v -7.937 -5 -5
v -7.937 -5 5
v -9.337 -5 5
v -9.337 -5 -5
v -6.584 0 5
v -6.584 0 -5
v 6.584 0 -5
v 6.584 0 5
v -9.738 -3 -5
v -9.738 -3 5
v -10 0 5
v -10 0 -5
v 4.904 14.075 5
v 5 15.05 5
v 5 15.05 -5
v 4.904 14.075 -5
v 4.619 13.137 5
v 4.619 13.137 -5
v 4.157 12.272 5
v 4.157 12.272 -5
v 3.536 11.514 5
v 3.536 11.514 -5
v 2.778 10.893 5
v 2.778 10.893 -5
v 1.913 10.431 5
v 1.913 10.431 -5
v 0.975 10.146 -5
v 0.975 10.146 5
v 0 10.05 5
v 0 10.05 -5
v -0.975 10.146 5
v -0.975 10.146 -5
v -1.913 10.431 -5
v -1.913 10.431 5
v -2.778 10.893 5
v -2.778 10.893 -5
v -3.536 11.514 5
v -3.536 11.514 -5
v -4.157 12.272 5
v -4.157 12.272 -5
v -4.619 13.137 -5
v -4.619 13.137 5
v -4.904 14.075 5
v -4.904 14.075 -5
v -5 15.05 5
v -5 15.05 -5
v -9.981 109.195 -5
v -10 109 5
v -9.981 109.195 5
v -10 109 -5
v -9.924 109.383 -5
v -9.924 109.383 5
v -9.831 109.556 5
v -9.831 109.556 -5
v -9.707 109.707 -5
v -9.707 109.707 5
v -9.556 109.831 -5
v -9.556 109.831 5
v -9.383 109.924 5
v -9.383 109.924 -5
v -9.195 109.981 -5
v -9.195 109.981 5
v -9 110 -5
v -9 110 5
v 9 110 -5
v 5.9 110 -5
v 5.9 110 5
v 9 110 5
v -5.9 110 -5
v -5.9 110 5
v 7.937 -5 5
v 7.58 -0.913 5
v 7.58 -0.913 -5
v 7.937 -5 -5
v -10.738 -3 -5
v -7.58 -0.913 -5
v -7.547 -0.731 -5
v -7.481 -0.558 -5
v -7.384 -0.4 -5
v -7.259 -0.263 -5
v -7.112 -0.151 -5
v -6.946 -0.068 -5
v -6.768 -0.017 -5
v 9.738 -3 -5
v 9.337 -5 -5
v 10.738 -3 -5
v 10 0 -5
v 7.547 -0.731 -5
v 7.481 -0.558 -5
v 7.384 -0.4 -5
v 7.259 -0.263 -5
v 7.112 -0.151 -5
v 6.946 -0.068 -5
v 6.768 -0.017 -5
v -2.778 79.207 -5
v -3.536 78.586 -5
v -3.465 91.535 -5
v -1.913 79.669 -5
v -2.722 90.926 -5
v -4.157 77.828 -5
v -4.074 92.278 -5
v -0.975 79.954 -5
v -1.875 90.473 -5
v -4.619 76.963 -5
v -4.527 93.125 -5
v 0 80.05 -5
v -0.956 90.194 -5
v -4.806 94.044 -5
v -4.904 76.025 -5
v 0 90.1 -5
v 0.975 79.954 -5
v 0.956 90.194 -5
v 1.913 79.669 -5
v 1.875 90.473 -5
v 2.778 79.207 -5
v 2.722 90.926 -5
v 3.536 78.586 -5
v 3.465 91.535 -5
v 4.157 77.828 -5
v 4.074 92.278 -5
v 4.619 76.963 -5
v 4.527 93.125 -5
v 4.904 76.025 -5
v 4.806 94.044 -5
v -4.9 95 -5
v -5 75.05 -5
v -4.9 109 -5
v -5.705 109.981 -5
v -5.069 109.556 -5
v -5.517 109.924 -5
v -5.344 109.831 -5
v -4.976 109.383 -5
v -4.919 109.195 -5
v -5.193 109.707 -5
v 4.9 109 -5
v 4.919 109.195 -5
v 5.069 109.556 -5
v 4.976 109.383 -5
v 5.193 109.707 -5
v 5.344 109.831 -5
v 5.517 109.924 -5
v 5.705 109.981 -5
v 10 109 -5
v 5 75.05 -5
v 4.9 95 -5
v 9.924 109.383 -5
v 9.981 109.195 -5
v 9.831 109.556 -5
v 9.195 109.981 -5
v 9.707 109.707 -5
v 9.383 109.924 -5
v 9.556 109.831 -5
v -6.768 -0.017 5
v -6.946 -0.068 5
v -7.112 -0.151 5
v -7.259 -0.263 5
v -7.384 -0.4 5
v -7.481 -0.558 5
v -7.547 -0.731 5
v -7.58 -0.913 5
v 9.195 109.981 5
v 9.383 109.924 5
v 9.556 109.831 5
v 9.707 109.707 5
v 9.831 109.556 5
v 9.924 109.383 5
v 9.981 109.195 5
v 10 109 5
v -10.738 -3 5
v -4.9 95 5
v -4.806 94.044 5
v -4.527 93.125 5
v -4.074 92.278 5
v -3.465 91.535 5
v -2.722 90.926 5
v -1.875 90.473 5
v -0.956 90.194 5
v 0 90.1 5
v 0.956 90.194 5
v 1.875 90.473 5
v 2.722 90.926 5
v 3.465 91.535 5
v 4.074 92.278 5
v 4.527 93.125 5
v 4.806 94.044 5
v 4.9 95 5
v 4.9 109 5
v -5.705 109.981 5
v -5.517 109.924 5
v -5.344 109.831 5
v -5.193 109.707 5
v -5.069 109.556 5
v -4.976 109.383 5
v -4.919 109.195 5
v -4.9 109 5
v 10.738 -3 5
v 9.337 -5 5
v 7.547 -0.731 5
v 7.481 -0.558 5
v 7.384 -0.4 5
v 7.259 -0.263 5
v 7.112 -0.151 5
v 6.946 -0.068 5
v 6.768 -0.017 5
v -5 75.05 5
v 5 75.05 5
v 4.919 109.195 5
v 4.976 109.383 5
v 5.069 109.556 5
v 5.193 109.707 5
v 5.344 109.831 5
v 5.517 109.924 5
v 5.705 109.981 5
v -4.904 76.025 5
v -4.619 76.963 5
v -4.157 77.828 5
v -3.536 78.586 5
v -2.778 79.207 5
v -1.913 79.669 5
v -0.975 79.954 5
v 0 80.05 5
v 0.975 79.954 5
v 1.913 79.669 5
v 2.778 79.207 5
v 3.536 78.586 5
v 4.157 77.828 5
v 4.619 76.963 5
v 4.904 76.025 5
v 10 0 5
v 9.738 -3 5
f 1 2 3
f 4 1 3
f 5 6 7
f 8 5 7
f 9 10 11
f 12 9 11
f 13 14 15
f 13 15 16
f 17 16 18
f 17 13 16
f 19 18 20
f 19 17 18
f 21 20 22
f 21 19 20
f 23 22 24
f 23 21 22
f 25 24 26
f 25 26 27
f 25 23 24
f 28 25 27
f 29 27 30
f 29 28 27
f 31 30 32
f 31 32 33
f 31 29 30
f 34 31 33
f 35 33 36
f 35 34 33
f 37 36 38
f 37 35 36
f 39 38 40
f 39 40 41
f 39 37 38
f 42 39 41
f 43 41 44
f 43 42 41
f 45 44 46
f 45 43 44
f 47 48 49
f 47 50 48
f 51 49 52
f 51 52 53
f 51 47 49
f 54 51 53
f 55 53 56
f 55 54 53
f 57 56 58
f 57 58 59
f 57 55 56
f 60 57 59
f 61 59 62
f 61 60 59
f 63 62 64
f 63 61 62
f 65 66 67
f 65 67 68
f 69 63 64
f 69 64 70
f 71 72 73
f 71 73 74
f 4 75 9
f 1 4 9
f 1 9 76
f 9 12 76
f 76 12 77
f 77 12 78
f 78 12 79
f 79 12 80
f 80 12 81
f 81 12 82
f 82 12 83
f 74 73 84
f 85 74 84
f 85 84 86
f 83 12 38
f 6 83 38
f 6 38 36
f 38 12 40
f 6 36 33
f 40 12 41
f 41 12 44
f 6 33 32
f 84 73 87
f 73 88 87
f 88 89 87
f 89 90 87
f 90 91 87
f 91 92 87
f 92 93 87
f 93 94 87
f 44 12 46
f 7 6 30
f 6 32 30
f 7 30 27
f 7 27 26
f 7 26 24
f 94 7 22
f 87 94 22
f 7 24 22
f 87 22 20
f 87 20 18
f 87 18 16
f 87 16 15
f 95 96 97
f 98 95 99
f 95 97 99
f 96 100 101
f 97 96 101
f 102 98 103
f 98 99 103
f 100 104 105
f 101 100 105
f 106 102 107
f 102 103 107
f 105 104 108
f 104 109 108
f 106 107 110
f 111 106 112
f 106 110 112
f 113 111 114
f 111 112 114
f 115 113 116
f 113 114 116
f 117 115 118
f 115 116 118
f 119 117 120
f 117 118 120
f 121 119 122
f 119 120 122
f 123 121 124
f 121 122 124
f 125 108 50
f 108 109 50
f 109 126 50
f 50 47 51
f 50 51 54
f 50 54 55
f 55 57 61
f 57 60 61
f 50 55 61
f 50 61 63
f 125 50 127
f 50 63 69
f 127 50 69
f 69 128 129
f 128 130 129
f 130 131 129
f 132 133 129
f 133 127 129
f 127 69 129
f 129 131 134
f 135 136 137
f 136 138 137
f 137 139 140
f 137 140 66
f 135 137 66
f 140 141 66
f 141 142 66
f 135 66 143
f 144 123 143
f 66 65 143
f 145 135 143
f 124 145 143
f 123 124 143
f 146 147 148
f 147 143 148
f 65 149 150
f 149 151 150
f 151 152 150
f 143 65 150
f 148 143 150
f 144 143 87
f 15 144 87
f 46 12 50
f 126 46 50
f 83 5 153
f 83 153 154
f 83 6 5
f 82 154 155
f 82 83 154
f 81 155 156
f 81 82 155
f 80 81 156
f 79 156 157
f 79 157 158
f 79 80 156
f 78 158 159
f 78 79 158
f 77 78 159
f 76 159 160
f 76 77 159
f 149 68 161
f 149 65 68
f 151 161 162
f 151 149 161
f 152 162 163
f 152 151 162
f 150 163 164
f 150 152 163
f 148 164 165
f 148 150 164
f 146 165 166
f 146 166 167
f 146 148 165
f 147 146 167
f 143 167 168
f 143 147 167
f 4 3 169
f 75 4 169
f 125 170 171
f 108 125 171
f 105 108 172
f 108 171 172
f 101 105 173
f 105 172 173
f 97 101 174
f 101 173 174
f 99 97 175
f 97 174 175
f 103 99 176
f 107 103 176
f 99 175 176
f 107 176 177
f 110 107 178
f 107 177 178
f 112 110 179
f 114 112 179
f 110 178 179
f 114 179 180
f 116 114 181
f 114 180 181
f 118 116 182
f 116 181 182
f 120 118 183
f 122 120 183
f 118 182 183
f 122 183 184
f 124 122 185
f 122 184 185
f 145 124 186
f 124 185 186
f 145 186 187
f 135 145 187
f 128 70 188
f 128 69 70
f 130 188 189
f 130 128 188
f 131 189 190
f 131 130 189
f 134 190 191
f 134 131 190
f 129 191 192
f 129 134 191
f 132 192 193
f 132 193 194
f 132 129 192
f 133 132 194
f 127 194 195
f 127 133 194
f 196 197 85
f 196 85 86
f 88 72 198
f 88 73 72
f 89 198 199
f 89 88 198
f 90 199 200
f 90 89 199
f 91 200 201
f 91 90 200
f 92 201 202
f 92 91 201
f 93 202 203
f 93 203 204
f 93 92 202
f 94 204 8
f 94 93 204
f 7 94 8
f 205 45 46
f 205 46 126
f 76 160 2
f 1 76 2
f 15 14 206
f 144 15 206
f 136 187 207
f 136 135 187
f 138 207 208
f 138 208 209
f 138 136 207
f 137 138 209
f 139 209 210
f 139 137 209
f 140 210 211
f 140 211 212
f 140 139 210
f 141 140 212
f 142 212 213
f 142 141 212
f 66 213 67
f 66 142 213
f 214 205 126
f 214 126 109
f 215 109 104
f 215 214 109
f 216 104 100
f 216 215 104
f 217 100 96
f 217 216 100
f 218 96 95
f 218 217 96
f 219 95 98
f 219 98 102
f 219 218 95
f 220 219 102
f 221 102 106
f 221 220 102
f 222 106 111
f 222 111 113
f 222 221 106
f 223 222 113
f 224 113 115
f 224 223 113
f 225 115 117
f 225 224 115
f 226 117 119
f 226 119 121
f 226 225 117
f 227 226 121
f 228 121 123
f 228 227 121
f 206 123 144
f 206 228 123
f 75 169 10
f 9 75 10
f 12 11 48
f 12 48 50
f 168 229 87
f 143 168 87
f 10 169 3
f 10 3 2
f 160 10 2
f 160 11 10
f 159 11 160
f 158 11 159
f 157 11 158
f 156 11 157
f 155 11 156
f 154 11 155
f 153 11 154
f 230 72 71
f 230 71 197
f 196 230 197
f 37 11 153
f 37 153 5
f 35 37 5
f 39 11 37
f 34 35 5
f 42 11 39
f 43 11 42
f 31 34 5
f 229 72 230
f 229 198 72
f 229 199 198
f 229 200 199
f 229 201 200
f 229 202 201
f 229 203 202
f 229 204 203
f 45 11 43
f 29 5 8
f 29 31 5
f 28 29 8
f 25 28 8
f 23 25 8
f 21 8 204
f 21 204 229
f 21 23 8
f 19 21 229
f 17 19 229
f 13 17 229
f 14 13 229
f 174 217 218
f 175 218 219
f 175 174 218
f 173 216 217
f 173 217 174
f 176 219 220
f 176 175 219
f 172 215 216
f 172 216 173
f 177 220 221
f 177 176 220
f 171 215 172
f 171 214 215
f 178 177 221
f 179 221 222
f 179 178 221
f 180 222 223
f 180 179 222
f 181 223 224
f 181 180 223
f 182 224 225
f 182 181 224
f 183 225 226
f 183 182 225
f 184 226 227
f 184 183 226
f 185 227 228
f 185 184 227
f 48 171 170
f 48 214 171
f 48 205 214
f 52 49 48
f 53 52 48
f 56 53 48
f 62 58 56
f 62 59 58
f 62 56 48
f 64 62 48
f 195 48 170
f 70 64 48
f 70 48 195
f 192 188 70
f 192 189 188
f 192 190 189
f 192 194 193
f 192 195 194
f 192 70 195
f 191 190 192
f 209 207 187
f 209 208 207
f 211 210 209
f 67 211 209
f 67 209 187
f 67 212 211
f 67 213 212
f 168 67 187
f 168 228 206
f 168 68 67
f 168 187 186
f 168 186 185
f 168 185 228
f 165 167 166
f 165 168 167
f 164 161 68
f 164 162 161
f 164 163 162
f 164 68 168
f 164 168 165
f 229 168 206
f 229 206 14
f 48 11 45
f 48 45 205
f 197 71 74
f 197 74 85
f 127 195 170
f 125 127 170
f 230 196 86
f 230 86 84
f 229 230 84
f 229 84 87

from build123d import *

# Parameters (mm, degrees)
SKETCH2_W           = 20
SKETCH2_H           = 10
BOSS_EXTRUDE1_DEPTH = 110
CUT_EXTRUDE1_DEPTH  = 10
SKETCH5_W           = 10
SKETCH5_H           = 60
CUT_EXTRUDE2_DEPTH  = 10
BOSS_EXTRUDE2_DEPTH = 10
FILLET1_R           = 1


with BuildPart() as part:
    # Sketch2 → Boss-Extrude1 (new body)
    with BuildSketch(Plane(origin=(0, 0, 0), x_dir=(1, 0, 0), z_dir=(0, 1, 0))):
        Rectangle(SKETCH2_W, SKETCH2_H)
    extrude(amount=BOSS_EXTRUDE1_DEPTH)

    # Sketch3 → Cut-Extrude1 (cut)
    with BuildSketch(Plane.XY.offset(5)):
        with BuildLine():
            Line((-4.9, 110), (-4.9, 95))
            ThreePointArc((-4.9, 95), (0, 90.1), (4.9, 95))
            Line((4.9, 95), (4.9, 110))
            Line((4.9, 110), (-4.9, 110))
        make_face()
    extrude(amount=-CUT_EXTRUDE1_DEPTH, mode=Mode.SUBTRACT)

    # Sketch5 → Cut-Extrude2 (cut)
    with BuildSketch(Plane.XY.offset(5)):
        with BuildLine():
            Line((-5, 15.05), (5, 15.05))
            ThreePointArc((5, 15.05), (0, 10.05), (-5, 15.05))
        make_face()
        with Locations((0, 45.05)):
            Rectangle(SKETCH5_W, SKETCH5_H)
        with BuildLine():
            ThreePointArc((-5, 75.05), (0, 80.05), (5, 75.05))
            Line((5, 75.05), (-5, 75.05))
        make_face()
    extrude(amount=-CUT_EXTRUDE2_DEPTH, mode=Mode.SUBTRACT)

    # Sketch4 → Boss-Extrude2 (add)
    with BuildSketch(Plane.XY.offset(5)):
        Polygon((-10, 0), (-7.5, 0), (-7.937443318, -5), (-9.33727069, -5), (-10.737534009, -3), (-9.737534009, -3), align=None)
    boss_extrude2 = extrude(amount=-BOSS_EXTRUDE2_DEPTH)

    # Mirror1: Boss-Extrude2 across plane
    add(boss_extrude2.mirror(Plane(origin=(0, 0, 0), x_dir=(0, 0, 1), z_dir=(1, 0, 0))))

    # Fillet1
    fillet1_edges = [part.edges().sort_by_distance(p)[0] for p in [
        (10, 110, 0),
        (-4.9, 110, 0),
        (4.9, 110, 0),
        (-7.5, 0, 0),
        (-10, 110, 0),
        (10, 0, 0),
        (-10, 0, 0),
        (7.5, 0, 0),
    ]]
    fillet(fillet1_edges, radius=FILLET1_R)


solid = part.part
